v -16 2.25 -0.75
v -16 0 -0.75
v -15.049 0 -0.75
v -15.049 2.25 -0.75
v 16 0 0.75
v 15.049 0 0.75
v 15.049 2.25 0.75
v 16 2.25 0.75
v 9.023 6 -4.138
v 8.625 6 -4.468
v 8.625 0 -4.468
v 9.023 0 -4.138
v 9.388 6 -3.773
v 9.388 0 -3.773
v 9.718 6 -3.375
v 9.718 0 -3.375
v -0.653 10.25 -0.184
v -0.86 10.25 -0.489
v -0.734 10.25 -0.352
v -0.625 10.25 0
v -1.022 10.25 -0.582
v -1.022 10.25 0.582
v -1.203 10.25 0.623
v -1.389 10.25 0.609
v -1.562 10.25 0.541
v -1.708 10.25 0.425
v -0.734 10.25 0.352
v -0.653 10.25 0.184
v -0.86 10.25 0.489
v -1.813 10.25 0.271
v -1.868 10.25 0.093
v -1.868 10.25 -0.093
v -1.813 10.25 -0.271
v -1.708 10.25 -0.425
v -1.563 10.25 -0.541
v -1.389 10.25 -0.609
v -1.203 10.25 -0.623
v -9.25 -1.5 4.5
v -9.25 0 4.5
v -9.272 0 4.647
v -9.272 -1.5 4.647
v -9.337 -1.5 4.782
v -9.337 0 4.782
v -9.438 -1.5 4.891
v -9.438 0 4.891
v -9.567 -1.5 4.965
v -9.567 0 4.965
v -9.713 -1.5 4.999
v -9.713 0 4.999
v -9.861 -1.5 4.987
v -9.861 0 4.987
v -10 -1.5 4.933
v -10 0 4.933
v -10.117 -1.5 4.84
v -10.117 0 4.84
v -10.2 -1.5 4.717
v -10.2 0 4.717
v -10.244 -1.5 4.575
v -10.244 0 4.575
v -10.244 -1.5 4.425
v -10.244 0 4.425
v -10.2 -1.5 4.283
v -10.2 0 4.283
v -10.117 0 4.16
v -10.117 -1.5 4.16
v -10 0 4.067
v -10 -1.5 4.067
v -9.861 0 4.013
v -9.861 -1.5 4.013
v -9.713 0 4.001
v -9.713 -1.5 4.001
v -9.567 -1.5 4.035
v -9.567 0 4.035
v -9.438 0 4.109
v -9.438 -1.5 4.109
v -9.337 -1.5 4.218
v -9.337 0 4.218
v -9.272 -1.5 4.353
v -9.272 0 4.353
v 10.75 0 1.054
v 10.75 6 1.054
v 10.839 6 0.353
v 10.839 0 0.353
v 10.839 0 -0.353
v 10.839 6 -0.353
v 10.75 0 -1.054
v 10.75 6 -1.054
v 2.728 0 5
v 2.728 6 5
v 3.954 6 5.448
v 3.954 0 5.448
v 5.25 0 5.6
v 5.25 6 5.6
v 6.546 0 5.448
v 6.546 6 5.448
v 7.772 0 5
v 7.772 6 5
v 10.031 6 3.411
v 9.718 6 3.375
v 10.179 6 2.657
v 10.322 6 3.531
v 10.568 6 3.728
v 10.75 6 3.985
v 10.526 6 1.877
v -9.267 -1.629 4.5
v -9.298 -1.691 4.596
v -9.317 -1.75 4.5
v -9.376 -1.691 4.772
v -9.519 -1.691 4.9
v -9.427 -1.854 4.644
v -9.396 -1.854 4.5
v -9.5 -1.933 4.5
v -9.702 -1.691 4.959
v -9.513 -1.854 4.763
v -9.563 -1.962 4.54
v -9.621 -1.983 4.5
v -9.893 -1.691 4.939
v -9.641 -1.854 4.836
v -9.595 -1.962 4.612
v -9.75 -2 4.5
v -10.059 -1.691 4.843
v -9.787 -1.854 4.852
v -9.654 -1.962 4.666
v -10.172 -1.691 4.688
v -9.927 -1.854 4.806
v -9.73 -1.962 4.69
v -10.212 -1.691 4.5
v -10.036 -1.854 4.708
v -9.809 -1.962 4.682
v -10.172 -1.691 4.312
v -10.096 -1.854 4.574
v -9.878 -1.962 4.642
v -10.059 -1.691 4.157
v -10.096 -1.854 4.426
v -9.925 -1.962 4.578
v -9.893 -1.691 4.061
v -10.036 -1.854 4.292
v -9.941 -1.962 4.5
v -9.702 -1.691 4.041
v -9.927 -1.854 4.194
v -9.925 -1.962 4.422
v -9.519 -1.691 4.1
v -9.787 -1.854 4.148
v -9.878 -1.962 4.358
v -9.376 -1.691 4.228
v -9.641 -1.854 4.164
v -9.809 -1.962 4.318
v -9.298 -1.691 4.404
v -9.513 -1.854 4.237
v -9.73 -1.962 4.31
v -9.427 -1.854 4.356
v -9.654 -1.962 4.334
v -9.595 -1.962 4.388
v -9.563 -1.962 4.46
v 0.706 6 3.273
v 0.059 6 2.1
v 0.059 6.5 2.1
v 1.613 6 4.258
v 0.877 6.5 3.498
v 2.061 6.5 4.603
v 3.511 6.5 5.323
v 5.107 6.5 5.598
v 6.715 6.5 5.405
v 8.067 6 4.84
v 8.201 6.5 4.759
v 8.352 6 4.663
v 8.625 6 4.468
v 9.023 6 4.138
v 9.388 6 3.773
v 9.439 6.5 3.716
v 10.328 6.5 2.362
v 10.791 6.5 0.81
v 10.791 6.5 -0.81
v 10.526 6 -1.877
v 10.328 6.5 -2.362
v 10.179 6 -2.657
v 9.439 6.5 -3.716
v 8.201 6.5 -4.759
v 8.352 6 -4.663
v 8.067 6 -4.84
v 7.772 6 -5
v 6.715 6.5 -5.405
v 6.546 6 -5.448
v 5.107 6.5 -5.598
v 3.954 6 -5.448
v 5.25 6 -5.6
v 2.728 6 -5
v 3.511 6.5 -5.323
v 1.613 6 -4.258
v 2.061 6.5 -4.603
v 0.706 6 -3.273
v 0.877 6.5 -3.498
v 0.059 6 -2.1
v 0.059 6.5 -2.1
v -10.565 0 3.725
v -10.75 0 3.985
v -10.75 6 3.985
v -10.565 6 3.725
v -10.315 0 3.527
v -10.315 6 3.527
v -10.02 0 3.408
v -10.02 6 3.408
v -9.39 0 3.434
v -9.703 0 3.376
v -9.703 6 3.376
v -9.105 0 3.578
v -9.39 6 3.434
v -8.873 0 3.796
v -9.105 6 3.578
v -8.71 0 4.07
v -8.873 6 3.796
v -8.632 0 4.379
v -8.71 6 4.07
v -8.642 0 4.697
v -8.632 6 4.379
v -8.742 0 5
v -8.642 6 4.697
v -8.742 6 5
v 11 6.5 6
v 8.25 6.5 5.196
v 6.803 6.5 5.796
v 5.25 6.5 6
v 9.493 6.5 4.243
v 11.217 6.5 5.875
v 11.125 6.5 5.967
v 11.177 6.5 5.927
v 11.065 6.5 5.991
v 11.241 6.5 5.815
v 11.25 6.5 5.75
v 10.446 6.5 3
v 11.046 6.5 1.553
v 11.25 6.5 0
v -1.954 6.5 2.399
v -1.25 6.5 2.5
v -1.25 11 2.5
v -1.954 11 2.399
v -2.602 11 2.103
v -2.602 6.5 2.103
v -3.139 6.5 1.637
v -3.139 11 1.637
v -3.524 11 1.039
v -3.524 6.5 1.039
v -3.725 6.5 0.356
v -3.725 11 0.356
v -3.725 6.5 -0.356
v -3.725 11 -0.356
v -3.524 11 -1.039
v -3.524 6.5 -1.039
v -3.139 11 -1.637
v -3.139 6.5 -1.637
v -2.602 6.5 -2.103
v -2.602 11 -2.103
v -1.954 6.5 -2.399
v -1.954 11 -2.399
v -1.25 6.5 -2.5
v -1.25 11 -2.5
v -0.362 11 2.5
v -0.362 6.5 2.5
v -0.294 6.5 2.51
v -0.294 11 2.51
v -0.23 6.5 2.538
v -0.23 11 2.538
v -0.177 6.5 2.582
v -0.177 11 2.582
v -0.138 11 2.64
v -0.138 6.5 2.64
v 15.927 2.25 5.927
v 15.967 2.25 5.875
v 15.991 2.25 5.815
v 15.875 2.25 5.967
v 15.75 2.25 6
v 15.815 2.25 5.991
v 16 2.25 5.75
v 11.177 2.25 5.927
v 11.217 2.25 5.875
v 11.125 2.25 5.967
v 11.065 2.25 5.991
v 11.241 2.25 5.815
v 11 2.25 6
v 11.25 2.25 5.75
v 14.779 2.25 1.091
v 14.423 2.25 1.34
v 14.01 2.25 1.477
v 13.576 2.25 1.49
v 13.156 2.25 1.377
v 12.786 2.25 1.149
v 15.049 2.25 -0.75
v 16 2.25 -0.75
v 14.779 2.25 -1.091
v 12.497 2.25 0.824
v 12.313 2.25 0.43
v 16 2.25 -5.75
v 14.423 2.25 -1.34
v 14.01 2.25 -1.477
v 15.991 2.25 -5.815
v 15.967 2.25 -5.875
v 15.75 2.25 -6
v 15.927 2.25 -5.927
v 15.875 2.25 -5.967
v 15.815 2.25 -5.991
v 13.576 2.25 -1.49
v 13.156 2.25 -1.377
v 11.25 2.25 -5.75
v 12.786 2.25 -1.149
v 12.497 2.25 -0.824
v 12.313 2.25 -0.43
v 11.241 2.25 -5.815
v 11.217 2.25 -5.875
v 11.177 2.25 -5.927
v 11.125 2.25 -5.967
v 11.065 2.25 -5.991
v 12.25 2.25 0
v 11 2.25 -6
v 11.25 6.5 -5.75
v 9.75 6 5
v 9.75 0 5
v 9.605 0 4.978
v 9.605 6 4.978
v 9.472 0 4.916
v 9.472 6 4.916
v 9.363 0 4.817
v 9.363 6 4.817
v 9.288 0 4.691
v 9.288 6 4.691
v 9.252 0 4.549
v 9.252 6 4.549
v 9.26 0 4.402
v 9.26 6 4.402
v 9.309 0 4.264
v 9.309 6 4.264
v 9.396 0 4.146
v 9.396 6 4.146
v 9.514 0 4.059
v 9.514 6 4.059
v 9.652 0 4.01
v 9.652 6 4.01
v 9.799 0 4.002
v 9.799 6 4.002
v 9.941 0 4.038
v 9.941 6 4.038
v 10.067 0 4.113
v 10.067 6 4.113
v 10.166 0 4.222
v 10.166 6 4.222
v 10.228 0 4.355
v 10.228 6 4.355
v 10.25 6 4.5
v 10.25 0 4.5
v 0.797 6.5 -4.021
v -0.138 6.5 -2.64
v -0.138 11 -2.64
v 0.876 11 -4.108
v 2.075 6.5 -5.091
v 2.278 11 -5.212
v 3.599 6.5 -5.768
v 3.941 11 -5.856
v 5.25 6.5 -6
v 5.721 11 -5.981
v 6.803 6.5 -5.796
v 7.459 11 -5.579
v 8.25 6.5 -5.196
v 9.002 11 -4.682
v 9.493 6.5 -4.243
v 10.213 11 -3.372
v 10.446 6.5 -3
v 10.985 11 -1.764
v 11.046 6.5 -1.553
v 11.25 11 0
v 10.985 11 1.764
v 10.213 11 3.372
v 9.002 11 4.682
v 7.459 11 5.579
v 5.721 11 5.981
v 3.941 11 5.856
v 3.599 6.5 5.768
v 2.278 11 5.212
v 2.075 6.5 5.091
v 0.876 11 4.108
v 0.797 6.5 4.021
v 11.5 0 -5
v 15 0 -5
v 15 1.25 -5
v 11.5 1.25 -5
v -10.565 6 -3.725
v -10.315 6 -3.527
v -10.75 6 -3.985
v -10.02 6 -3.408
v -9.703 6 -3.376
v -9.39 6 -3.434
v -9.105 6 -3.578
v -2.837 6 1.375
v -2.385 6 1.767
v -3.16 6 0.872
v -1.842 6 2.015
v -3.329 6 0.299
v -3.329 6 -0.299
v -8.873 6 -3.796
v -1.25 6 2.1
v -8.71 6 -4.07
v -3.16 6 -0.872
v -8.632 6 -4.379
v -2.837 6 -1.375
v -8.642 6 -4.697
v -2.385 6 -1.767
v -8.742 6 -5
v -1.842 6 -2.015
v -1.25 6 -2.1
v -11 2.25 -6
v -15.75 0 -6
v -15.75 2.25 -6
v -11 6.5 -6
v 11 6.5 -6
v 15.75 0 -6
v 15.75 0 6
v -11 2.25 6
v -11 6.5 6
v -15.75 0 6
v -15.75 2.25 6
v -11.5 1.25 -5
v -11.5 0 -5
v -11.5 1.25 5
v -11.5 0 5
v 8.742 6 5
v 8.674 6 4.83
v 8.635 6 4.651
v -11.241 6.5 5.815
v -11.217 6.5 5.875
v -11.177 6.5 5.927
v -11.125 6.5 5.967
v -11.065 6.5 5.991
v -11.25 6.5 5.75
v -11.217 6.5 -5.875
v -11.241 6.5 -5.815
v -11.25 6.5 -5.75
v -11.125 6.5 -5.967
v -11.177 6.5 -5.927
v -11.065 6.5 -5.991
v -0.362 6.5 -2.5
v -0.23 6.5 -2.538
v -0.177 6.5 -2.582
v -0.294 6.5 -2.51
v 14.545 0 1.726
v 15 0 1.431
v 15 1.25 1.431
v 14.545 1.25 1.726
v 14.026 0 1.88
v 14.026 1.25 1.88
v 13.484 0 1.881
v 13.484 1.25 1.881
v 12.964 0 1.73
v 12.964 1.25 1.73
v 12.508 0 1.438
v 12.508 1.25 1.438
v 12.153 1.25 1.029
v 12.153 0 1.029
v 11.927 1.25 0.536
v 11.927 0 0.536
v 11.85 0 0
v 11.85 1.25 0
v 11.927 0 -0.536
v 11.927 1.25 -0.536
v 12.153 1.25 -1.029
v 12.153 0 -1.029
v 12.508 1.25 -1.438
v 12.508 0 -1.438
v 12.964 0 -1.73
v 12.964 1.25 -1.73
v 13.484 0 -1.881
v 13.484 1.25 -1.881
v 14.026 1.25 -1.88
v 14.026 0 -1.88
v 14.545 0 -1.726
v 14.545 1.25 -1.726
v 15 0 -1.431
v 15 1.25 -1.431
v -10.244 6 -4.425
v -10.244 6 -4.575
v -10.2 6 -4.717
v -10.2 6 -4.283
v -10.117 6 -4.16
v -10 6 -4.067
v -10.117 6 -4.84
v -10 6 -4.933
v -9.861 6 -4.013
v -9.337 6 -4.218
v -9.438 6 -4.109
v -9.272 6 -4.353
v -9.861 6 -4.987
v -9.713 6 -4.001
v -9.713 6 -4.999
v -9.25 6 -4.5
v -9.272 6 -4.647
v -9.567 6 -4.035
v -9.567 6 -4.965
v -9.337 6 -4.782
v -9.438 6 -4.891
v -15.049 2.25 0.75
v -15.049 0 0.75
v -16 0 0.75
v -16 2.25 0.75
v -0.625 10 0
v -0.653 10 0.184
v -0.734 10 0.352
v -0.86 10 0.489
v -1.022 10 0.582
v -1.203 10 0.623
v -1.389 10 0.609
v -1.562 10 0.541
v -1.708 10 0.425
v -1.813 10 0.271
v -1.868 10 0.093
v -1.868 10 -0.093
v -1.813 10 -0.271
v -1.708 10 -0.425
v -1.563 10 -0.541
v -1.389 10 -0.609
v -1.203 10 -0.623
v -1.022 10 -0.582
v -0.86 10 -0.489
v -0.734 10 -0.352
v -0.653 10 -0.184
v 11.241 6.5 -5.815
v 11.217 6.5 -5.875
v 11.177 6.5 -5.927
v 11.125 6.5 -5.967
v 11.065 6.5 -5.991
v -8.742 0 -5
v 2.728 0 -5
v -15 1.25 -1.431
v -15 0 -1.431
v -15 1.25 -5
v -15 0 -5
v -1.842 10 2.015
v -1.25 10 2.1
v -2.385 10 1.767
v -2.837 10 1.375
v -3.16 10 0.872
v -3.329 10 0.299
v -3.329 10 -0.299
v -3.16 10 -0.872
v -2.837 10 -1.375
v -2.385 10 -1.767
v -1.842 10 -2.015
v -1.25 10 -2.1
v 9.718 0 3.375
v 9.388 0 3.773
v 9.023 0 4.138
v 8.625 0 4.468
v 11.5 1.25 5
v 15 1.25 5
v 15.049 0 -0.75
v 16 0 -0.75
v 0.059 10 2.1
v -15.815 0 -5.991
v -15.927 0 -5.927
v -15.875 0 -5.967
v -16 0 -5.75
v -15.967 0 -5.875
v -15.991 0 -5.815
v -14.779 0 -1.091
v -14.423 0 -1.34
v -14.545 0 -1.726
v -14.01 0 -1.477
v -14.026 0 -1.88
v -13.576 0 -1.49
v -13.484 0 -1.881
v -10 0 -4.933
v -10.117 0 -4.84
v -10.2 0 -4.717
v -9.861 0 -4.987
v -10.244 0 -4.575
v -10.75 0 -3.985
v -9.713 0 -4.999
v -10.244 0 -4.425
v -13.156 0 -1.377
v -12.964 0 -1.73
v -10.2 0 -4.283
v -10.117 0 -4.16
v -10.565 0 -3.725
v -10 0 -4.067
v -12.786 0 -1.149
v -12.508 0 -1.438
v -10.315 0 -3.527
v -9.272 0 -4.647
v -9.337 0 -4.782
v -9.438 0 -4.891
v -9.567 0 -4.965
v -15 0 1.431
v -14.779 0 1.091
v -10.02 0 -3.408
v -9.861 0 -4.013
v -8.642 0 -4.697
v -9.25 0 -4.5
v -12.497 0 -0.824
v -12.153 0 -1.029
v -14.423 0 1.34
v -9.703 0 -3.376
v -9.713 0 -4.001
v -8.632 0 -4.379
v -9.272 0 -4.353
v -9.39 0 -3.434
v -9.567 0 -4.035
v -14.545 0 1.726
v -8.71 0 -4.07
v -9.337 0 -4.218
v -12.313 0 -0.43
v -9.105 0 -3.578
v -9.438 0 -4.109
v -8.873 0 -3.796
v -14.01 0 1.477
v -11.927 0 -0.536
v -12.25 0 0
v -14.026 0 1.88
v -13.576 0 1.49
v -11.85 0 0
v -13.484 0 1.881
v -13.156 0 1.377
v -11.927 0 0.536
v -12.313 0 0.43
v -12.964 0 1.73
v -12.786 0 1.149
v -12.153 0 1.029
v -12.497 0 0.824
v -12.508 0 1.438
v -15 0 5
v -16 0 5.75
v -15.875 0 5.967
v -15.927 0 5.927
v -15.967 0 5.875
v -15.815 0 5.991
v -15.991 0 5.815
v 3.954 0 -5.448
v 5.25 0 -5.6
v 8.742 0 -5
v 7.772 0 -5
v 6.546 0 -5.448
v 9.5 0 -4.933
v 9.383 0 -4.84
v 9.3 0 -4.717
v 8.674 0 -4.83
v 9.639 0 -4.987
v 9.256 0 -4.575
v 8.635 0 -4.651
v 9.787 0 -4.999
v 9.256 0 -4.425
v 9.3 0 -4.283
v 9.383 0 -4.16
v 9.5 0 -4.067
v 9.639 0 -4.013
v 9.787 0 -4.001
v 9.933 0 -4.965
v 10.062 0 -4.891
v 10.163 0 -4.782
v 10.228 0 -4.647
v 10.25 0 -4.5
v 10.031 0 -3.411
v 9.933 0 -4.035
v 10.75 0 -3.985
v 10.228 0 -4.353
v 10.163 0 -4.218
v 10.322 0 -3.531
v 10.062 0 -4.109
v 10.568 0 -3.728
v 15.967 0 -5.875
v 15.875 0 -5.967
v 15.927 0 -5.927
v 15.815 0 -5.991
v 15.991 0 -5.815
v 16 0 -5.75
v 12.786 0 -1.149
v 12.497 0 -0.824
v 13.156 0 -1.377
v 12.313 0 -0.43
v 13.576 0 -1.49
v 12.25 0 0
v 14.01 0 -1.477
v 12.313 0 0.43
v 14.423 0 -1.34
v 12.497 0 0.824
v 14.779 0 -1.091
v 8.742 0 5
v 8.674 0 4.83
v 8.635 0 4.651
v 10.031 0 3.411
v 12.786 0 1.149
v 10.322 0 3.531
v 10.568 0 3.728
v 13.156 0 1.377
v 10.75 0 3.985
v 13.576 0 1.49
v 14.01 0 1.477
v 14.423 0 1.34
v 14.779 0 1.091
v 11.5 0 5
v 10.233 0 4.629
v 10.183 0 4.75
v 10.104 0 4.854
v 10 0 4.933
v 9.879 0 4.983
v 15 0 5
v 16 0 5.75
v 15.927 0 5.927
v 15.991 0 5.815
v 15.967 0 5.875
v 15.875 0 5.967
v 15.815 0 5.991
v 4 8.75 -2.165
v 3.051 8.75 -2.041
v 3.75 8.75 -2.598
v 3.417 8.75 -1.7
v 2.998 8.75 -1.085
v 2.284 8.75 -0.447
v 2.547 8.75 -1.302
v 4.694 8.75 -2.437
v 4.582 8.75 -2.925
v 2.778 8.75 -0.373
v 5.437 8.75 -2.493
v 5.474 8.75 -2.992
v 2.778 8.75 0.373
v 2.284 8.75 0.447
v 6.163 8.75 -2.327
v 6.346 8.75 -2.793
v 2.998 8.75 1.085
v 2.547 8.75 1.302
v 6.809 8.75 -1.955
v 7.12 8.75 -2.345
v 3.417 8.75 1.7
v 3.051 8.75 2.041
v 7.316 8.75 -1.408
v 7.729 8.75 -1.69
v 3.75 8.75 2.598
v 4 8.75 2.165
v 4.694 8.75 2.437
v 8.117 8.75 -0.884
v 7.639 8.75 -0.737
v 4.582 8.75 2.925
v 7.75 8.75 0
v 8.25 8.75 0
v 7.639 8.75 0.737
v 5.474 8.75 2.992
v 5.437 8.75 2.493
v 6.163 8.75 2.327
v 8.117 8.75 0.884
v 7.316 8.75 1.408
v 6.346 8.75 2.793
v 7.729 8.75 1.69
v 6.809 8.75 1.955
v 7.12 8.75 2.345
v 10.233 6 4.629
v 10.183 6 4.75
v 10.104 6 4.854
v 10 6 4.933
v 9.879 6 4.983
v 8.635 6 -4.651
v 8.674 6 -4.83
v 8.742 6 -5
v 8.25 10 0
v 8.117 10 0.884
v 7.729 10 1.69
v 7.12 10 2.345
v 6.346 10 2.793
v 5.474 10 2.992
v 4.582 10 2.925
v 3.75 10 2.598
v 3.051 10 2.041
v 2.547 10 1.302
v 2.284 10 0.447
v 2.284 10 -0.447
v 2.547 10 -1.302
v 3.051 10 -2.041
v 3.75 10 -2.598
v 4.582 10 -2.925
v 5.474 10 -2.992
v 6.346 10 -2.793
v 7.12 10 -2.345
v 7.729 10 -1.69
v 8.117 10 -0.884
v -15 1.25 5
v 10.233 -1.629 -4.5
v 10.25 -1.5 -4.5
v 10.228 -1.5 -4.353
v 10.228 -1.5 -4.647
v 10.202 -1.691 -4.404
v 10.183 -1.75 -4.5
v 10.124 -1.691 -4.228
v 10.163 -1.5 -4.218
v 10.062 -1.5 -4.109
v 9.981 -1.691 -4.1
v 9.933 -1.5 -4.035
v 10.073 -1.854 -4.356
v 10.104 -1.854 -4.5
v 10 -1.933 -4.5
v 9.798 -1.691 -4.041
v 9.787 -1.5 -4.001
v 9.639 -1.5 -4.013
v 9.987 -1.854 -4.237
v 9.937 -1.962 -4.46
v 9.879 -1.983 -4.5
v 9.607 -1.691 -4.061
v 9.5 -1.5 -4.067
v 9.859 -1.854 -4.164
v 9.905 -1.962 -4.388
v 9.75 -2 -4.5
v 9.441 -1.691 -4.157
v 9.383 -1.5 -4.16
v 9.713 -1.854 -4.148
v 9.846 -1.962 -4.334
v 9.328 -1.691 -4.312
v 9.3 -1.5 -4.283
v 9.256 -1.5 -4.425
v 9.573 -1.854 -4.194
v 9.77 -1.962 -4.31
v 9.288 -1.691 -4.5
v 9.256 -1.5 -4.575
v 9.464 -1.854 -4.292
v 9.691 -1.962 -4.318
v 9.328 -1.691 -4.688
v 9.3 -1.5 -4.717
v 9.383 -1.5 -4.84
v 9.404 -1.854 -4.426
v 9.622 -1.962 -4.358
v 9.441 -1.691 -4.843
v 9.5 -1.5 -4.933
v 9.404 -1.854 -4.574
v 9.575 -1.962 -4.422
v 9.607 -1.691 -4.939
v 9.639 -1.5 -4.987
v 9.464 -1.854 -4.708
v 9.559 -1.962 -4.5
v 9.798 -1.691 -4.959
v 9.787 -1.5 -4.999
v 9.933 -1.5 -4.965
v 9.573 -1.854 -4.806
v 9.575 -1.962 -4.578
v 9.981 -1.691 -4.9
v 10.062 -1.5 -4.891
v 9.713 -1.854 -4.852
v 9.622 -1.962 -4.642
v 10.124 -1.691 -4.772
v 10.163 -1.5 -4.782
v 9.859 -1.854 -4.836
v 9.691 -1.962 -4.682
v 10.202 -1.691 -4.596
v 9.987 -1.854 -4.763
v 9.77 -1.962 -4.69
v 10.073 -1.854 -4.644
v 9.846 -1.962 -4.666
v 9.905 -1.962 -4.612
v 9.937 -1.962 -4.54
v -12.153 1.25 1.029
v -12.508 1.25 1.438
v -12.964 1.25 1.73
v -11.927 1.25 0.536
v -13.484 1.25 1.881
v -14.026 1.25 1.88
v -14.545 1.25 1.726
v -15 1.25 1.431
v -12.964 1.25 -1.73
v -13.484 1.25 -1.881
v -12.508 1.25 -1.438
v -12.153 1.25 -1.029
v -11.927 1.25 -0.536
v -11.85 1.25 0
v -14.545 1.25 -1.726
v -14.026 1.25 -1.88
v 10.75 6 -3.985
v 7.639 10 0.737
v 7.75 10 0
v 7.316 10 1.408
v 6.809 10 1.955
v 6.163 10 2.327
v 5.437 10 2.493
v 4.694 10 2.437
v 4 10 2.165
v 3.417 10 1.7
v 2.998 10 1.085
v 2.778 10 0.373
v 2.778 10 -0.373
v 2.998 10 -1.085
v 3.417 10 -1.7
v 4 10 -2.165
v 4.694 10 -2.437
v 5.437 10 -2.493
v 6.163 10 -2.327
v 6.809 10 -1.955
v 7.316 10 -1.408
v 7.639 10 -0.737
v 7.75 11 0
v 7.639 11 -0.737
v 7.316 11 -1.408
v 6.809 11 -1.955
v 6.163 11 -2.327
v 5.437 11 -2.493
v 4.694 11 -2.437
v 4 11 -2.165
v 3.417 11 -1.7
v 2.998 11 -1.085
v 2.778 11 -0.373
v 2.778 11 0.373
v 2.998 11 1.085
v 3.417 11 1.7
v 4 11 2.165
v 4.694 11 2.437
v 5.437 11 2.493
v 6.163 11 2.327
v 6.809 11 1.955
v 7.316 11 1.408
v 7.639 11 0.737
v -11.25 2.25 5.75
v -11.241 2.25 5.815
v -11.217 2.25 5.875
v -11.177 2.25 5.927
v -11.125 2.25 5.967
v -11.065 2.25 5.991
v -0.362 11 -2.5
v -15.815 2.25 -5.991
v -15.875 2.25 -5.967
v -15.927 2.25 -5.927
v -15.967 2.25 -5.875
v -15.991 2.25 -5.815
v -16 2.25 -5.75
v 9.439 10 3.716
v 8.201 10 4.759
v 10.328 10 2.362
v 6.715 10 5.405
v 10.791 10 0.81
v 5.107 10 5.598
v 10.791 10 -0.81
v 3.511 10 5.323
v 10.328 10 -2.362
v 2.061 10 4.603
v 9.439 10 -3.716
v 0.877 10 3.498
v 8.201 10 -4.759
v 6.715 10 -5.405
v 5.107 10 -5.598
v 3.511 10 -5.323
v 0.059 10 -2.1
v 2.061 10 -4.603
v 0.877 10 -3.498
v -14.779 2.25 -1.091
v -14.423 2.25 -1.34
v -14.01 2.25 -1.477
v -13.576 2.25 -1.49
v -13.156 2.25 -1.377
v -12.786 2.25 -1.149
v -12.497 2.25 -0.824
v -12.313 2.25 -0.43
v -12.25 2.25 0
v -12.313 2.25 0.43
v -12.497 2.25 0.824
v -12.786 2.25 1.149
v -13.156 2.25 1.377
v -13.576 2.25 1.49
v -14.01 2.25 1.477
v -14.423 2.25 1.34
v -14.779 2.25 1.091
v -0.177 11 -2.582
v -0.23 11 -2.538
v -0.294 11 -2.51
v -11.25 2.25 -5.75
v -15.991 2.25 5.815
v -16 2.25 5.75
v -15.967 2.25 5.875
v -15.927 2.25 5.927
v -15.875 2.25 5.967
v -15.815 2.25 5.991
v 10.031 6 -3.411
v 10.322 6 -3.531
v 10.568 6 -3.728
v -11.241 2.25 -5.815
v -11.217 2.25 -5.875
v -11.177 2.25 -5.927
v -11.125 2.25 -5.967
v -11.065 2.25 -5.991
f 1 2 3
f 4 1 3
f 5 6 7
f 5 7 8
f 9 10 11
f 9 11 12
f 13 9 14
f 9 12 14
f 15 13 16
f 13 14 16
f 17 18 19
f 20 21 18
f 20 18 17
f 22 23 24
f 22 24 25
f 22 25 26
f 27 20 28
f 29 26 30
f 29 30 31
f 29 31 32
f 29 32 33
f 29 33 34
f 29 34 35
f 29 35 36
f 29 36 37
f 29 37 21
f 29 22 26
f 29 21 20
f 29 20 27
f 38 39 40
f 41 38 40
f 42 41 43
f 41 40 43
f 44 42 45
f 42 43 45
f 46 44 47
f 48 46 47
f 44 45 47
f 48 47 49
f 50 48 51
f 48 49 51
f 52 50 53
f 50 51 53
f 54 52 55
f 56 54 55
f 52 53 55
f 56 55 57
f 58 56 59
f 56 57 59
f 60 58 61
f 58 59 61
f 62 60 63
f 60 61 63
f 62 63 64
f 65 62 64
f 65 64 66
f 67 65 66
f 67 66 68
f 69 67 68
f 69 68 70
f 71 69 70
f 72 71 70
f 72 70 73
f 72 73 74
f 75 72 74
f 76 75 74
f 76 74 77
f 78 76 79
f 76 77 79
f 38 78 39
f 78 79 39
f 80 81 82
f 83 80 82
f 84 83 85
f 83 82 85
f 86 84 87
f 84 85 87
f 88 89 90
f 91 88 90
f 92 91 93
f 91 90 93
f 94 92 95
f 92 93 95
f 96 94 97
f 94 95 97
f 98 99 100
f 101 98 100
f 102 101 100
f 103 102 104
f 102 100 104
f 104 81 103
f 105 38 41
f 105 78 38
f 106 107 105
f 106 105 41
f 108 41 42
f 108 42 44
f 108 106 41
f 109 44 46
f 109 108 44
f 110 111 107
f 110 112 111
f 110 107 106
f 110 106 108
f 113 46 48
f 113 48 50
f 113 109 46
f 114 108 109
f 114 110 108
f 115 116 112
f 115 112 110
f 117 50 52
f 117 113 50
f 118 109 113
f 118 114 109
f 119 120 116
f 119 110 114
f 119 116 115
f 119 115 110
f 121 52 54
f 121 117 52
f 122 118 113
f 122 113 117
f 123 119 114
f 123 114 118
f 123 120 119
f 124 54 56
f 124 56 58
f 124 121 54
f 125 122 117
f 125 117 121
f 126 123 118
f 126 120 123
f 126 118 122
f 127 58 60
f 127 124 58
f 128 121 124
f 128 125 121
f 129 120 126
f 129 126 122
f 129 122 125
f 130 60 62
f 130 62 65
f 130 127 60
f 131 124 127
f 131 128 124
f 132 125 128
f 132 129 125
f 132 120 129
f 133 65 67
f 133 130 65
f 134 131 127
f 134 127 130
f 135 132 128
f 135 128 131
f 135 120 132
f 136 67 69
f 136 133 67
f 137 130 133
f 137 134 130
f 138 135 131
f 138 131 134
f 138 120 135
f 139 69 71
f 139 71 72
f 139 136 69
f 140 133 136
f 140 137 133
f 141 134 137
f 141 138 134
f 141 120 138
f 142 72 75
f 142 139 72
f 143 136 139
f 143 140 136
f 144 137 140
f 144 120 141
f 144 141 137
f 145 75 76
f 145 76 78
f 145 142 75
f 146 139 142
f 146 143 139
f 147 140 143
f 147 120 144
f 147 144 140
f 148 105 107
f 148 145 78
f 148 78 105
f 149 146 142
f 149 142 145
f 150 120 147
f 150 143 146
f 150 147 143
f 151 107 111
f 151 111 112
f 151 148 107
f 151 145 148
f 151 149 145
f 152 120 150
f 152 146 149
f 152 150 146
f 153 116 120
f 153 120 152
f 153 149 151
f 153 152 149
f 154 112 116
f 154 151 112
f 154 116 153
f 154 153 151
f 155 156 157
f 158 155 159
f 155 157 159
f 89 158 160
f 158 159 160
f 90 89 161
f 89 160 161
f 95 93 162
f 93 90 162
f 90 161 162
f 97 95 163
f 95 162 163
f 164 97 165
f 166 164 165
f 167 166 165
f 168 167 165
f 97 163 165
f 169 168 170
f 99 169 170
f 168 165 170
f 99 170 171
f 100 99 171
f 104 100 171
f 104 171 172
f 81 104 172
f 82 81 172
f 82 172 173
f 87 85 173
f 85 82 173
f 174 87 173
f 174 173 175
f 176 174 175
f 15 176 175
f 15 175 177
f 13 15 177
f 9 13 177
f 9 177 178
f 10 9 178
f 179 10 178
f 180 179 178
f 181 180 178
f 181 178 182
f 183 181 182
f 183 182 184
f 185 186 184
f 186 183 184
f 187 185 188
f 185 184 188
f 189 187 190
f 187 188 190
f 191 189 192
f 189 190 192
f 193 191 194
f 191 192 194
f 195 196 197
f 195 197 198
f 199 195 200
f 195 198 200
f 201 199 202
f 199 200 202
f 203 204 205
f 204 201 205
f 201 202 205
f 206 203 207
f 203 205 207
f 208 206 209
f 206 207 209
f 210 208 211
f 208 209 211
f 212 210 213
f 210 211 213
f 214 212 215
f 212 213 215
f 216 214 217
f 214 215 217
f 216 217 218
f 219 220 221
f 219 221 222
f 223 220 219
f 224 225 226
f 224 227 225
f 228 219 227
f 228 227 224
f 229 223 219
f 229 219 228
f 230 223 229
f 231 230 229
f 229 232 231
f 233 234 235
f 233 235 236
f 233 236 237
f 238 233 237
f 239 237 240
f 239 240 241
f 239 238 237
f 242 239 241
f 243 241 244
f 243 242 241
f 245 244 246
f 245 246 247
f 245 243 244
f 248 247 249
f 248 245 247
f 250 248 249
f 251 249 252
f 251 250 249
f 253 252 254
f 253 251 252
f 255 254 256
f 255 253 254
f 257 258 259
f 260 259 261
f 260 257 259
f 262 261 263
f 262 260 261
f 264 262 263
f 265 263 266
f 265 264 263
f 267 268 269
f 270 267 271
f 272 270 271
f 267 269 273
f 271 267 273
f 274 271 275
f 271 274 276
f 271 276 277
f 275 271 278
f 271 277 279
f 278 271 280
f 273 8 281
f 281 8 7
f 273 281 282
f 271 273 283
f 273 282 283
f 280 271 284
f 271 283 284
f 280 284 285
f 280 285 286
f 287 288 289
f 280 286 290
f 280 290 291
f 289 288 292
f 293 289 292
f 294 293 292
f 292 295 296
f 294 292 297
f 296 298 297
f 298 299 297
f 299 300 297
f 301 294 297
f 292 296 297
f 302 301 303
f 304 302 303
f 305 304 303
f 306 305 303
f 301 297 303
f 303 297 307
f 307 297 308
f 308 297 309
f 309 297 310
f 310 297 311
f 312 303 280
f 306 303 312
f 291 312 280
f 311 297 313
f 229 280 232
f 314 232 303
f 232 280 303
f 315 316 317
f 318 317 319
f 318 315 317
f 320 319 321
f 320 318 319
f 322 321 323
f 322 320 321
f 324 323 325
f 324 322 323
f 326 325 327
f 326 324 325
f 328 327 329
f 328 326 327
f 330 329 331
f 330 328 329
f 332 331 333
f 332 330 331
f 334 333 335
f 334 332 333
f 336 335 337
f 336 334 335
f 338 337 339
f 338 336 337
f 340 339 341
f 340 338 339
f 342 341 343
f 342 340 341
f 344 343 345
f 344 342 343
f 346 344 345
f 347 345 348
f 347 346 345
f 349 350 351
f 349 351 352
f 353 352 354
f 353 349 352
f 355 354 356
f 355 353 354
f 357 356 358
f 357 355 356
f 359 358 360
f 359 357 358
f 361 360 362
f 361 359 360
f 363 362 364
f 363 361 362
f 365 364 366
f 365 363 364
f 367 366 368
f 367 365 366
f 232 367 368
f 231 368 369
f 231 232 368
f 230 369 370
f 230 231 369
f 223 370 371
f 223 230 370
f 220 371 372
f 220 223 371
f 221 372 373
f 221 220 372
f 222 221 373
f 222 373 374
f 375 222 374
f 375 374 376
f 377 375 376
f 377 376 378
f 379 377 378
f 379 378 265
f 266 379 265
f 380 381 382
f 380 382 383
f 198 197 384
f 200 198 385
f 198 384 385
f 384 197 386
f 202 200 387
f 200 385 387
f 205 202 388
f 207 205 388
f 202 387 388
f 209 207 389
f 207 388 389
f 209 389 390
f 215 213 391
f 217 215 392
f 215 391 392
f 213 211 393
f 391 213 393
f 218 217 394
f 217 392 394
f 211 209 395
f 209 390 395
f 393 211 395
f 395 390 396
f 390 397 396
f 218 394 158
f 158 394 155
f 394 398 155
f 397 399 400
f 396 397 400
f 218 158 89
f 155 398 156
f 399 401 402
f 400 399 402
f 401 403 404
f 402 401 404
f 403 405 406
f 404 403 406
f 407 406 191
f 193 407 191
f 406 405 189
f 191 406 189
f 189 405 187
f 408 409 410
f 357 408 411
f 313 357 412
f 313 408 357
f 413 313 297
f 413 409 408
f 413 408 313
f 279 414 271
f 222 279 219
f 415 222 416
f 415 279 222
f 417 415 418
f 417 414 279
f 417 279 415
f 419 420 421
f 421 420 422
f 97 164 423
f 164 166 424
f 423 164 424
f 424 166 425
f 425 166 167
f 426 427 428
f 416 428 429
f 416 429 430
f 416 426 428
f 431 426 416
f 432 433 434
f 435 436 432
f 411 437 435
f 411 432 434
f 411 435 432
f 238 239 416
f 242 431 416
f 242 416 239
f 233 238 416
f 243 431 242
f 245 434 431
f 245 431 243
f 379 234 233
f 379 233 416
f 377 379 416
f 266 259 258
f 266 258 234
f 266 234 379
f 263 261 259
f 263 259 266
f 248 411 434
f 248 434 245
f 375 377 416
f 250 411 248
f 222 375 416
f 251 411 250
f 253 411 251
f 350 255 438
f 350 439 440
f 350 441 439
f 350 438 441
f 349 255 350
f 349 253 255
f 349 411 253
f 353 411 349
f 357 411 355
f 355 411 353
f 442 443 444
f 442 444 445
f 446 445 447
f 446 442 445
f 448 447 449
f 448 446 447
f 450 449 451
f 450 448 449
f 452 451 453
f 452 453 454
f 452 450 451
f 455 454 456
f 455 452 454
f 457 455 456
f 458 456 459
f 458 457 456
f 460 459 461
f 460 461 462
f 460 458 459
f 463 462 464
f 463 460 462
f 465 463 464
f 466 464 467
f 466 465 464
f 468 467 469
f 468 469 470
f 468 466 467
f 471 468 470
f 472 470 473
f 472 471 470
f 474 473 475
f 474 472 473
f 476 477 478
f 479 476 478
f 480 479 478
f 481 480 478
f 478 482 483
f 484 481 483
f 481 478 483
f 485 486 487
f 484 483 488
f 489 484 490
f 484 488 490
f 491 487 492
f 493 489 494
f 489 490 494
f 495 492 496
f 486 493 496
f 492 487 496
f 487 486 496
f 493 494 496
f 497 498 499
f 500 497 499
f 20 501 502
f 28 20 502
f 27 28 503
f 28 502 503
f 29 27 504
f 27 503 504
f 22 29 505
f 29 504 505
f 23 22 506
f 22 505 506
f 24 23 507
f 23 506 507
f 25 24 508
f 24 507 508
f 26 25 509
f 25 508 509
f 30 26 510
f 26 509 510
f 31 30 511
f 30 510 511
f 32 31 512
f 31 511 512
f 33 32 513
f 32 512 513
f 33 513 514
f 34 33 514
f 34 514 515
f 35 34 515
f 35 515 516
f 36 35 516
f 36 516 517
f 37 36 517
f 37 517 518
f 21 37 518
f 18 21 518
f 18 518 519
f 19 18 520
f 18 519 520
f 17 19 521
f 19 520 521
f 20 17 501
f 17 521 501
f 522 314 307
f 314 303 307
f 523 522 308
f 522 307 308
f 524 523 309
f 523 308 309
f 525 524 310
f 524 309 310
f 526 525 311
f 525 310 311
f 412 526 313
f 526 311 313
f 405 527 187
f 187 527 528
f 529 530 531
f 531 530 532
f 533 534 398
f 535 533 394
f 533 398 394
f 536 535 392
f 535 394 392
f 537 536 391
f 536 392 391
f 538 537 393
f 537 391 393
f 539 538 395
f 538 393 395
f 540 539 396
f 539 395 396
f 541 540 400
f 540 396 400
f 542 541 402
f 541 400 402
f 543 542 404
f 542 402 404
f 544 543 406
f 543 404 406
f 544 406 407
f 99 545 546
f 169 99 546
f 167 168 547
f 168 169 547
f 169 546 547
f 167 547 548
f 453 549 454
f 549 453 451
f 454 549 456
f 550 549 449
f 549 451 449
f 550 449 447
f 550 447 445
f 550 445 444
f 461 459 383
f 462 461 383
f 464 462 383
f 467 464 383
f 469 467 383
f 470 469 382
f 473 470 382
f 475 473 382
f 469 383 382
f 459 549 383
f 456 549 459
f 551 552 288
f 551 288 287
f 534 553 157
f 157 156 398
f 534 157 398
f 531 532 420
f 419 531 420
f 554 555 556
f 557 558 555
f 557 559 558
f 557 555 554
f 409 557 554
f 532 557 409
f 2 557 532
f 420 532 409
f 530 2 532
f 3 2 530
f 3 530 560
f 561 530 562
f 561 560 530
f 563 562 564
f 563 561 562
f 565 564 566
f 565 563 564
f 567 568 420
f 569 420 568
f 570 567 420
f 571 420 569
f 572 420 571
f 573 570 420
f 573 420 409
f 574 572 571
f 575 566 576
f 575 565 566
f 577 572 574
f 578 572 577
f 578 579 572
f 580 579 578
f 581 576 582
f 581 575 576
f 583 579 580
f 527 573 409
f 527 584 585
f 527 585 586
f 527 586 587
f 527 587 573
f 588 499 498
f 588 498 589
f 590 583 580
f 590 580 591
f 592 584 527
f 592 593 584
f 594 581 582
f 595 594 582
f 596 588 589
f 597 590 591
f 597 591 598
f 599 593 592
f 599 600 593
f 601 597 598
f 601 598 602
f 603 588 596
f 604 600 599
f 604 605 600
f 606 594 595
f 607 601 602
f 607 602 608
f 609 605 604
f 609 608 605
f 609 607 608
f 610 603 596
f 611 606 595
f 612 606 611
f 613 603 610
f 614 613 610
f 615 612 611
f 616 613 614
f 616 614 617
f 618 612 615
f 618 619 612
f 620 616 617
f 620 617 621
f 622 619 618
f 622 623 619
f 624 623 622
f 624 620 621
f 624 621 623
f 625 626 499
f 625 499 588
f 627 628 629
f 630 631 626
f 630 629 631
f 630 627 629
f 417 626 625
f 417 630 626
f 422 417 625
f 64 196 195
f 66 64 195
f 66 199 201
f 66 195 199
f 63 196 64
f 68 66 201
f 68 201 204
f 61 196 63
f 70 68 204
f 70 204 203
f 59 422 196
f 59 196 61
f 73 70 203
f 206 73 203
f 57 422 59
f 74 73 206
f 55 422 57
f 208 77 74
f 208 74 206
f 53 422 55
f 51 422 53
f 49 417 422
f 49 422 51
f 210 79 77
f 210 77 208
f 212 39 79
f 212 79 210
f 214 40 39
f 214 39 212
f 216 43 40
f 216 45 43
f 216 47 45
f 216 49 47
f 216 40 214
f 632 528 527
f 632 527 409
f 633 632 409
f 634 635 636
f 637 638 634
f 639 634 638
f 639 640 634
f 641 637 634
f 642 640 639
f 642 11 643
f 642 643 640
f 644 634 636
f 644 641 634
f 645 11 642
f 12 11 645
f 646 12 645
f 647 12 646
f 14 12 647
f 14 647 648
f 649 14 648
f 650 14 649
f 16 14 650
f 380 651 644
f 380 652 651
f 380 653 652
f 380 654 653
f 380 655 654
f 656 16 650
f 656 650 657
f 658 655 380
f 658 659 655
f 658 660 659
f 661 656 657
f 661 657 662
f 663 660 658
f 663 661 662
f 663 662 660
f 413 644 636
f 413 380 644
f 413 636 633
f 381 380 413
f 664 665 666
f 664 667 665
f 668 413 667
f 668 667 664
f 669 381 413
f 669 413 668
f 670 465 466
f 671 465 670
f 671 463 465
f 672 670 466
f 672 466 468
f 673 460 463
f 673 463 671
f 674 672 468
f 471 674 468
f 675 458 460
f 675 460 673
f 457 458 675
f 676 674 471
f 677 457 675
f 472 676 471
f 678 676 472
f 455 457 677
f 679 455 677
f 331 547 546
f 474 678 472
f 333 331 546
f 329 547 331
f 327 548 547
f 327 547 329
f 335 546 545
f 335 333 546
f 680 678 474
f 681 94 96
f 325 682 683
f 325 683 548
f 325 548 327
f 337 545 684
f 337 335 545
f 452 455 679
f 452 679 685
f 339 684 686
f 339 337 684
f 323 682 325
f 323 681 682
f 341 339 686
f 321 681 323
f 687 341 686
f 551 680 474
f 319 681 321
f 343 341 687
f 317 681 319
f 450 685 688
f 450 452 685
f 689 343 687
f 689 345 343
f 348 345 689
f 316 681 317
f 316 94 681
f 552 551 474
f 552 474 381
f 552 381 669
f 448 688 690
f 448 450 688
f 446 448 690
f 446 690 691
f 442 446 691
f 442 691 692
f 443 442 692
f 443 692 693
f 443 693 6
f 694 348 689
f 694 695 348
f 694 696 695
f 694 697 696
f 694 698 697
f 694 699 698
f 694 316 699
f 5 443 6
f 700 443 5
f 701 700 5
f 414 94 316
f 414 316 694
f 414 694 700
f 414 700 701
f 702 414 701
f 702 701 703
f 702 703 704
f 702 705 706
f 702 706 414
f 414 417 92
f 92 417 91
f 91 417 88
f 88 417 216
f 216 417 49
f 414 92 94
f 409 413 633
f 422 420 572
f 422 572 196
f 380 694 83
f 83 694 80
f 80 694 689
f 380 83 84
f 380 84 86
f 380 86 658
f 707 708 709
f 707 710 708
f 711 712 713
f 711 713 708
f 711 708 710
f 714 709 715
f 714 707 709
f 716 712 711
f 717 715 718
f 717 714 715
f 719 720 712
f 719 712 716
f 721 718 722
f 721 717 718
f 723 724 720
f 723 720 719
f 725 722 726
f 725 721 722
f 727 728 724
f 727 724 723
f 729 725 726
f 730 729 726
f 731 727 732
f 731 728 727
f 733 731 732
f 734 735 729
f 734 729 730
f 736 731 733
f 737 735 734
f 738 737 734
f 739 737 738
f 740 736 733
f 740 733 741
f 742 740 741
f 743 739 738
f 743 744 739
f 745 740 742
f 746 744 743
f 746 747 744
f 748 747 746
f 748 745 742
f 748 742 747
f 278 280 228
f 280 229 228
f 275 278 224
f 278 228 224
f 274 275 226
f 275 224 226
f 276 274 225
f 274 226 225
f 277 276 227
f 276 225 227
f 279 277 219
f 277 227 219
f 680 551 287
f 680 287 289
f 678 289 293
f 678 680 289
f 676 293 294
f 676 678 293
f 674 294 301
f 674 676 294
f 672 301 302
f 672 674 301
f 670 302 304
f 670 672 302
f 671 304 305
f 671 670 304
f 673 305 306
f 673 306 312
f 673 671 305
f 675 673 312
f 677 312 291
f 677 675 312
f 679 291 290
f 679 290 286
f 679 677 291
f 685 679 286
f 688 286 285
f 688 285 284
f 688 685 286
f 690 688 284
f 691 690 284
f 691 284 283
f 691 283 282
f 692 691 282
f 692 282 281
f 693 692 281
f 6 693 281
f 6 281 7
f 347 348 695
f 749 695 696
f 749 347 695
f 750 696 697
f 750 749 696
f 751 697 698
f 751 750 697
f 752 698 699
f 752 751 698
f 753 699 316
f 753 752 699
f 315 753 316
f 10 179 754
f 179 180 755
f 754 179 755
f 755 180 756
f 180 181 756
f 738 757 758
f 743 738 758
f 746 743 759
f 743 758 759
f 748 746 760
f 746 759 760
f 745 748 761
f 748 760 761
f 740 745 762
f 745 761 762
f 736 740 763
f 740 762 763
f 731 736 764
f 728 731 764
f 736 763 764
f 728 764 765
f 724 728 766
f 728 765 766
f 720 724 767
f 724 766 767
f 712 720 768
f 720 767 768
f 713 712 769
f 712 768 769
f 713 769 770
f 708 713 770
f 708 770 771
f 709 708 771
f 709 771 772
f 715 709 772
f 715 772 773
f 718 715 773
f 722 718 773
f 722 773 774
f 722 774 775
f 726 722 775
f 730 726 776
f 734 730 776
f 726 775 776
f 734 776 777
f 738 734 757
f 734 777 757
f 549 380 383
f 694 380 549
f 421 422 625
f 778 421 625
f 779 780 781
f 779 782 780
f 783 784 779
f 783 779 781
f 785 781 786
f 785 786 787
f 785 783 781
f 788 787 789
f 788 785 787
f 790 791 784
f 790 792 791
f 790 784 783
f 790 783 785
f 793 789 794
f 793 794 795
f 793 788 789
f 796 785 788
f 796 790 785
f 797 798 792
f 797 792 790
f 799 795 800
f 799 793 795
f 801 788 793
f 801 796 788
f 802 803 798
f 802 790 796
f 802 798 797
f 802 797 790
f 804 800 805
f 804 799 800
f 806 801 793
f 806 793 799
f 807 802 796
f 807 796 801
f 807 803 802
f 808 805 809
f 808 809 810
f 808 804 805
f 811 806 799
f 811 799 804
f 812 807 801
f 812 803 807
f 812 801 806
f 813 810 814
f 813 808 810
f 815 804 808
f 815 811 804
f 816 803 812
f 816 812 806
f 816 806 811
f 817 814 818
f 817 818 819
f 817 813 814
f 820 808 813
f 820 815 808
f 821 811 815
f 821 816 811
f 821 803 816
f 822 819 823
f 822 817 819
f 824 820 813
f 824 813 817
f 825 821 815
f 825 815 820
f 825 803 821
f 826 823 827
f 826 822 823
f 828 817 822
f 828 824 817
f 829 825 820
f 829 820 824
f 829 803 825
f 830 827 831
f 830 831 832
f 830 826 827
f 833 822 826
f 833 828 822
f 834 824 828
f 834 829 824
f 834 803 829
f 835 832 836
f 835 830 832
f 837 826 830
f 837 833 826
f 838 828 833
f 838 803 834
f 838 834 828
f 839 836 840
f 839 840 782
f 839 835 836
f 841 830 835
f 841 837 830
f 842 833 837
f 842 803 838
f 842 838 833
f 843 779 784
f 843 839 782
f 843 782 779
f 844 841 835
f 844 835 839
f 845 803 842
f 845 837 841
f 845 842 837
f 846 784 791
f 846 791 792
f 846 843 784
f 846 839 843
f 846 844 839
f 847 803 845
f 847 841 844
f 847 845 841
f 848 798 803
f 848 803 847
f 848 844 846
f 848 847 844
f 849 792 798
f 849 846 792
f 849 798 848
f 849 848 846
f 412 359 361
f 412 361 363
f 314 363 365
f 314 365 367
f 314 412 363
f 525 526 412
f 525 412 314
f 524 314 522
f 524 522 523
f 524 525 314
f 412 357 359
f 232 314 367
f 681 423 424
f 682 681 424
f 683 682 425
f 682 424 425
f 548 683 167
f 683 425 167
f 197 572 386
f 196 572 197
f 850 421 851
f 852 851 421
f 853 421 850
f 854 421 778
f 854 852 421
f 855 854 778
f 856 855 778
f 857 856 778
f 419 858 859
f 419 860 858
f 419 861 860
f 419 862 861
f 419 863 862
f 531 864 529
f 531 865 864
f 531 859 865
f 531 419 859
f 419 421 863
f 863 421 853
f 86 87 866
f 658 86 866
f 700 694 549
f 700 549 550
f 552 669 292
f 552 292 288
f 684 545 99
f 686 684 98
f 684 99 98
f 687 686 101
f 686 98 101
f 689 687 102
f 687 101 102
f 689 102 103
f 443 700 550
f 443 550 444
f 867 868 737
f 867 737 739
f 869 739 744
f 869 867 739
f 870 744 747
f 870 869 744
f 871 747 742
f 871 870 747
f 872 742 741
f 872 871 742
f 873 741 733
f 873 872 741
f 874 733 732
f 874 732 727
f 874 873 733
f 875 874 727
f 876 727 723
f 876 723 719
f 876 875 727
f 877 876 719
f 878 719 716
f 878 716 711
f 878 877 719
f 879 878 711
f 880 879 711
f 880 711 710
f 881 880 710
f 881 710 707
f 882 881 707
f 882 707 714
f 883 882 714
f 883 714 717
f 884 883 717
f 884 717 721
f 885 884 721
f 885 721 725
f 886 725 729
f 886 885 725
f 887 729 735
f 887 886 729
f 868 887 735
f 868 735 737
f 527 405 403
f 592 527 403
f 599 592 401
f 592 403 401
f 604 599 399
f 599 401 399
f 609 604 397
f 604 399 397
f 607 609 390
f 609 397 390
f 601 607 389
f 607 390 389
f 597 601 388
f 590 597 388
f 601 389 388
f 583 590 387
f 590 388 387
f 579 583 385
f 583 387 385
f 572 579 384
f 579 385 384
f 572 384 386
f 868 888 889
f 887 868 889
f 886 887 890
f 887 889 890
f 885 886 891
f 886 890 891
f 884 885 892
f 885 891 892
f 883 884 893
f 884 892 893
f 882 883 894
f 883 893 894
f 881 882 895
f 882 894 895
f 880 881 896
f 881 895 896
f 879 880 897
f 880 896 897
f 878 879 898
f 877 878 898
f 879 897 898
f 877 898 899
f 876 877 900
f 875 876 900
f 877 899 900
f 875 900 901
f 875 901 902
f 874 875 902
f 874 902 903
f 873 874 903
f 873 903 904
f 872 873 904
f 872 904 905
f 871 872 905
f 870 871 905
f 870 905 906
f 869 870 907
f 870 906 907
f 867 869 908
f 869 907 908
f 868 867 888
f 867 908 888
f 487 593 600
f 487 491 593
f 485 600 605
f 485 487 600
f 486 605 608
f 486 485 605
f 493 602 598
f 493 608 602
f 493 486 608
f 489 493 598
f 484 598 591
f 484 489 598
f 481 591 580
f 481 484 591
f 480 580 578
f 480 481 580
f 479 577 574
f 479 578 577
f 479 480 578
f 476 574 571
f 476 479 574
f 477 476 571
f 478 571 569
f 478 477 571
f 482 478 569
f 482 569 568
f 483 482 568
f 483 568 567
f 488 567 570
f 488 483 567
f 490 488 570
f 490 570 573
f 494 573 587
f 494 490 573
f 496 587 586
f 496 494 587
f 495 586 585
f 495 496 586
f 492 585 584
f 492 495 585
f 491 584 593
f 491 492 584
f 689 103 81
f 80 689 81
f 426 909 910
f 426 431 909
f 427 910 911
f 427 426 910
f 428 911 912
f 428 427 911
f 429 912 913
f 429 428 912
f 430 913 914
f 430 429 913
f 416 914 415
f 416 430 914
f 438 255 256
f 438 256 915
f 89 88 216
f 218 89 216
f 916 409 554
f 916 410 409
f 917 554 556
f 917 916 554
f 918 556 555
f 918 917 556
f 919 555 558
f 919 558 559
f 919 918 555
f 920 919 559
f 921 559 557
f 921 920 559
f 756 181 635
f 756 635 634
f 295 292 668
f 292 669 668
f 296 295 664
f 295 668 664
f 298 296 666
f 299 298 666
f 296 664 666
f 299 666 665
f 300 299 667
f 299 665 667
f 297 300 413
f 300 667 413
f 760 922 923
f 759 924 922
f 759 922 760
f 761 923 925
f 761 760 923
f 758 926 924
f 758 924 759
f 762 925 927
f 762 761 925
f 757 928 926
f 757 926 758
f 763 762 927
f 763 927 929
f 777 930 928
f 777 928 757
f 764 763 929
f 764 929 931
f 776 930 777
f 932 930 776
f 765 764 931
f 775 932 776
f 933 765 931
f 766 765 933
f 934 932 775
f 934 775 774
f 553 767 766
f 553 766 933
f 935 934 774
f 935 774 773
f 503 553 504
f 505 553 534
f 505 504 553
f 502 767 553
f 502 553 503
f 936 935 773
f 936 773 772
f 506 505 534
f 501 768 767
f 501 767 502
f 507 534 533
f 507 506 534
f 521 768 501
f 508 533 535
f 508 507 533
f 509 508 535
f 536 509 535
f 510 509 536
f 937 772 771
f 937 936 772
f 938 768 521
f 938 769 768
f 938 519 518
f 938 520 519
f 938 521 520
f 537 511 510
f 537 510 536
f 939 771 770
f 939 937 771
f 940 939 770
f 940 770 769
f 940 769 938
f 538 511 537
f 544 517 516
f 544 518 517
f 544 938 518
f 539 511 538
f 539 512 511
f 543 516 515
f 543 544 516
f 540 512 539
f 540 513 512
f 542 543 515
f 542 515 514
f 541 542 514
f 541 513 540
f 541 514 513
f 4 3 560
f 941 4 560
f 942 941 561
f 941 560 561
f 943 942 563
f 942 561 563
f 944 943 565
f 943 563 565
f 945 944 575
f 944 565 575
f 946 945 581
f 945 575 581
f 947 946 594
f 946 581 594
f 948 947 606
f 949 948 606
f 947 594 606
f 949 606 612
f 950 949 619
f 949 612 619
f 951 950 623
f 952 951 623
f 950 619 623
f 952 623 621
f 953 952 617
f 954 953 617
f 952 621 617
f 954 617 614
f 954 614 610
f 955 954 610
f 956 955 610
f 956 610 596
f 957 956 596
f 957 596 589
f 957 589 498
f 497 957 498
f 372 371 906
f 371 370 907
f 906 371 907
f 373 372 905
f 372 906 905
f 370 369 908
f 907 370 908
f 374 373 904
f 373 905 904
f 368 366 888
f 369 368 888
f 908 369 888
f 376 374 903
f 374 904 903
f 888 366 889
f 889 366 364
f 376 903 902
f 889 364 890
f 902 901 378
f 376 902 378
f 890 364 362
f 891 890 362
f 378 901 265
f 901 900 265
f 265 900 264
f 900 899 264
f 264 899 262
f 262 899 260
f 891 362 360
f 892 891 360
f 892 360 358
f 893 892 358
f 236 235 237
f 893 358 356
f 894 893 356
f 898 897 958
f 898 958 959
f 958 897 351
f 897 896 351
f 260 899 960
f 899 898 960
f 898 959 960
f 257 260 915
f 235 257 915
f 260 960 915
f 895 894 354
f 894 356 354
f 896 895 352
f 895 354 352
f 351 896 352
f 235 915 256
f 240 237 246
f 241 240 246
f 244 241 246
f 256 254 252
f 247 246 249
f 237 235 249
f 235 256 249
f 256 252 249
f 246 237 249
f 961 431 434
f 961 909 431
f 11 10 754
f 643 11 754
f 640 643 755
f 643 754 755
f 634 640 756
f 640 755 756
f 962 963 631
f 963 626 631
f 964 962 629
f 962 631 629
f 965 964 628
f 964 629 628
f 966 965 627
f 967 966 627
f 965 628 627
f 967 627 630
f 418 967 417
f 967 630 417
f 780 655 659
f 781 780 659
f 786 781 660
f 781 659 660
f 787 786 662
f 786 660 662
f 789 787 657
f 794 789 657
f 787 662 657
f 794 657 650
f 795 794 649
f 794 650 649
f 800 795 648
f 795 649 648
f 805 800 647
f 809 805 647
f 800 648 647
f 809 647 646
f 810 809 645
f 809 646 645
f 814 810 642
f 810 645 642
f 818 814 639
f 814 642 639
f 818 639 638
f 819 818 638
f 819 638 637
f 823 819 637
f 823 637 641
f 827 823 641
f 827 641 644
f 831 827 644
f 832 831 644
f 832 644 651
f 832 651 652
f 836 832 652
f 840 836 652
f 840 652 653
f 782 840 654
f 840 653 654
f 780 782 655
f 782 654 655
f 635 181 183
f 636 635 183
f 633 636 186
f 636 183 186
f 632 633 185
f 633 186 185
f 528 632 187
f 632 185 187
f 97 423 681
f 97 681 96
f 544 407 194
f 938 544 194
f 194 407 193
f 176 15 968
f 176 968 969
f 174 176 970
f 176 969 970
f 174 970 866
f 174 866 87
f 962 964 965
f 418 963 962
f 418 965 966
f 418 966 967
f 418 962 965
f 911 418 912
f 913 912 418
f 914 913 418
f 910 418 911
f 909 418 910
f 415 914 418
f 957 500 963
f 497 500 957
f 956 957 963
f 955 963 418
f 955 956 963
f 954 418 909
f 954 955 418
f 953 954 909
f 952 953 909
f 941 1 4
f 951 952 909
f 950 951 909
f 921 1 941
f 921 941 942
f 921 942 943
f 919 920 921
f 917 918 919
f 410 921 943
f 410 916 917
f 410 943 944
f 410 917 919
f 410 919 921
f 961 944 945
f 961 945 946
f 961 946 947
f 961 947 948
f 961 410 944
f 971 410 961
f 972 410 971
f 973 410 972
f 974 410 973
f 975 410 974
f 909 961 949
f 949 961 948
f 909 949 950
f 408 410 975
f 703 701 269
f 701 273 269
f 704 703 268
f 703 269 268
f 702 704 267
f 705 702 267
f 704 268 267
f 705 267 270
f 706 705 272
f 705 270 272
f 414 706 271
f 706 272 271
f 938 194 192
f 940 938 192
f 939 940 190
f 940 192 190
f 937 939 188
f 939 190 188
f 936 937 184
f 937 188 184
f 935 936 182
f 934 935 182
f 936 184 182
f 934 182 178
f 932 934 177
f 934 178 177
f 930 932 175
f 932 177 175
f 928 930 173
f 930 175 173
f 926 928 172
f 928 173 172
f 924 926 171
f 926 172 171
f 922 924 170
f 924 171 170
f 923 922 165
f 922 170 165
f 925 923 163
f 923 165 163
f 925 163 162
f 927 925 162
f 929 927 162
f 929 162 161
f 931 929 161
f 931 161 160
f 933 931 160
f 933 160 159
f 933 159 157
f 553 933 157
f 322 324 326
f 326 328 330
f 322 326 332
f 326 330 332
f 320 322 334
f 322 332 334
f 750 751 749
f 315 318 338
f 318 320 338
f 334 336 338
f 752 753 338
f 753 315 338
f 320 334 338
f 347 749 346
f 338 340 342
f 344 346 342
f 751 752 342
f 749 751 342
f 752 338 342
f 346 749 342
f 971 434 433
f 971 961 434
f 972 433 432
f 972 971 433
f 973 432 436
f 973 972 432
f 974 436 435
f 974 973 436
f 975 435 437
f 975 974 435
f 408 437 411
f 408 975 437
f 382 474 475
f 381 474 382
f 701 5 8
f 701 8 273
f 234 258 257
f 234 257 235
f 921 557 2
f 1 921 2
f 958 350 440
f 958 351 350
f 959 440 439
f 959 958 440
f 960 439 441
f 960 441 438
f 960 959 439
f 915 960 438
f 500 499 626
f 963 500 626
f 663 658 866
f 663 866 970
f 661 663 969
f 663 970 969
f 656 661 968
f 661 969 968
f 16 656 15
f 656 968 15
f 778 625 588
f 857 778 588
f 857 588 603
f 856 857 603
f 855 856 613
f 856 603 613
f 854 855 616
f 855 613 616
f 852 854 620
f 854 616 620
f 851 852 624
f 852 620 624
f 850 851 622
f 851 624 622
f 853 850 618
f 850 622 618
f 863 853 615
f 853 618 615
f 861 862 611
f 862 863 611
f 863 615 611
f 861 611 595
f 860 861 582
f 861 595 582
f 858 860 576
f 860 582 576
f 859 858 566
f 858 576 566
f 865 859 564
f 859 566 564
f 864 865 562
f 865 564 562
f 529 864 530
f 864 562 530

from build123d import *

# Parameters (mm, degrees)
SKETCH1_W            = 22.5
SKETCH1_H            = 12
BOSS_EXTRUDE1_DEPTH  = 6.5
SKETCH2_W            = 22.5
SKETCH2_H            = 12
BOSS_EXTRUDE2_DEPTH  = 0.5
BOSS_EXTRUDE3_DEPTH  = 4.5
SKETCH4_R            = 2.5
BOSS_EXTRUDE4_DEPTH  = 1
CUT_EXTRUDE1_DEPTH   = 7.5
SKETCH6_R            = 3
SKETCH6_R_2          = 2.5
BOSS_EXTRUDE5_DEPTH  = 1.25
BOSS_EXTRUDE7_DEPTH  = 2.25
BOSS_EXTRUDE8_DEPTH  = 1
SKETCH9_R            = 0.625
CUT_EXTRUDE2_DEPTH   = 0.25
SKETCH11_R           = 1.125
SKETCH11_R_2         = 0.5
BOSS_EXTRUDE9_DEPTH  = 6
SKETCH12_R           = 0.5
BOSS_EXTRUDE10_DEPTH = 2
FILLET1_R            = 0.5
FILLET2_R            = 0.25
CUT_EXTRUDE3_DEPTH   = 6


with BuildPart() as part:
    # Sketch1 → Boss-Extrude1 (new body)
    with BuildSketch(Plane(origin=(0, 0, 0), x_dir=(1, 0, 0), z_dir=(0, 1, 0))):
        Rectangle(SKETCH1_W, SKETCH1_H)
        Polygon((10.25, 5), (-10.25, 5), (-10.75, 5), (-10.75, -5), (-10.25, -5), (10.25, -5), (10.75, -5), (10.75, 5), align=None, mode=Mode.SUBTRACT)
    extrude(amount=BOSS_EXTRUDE1_DEPTH)

    # Sketch2 → Boss-Extrude2 (add)
    with BuildSketch(Plane(origin=(0, 6.5, 0), x_dir=(1, 0, 0), z_dir=(0, 1, 0))):
        Rectangle(SKETCH2_W, SKETCH2_H)
    extrude(amount=-BOSS_EXTRUDE2_DEPTH)

    # Sketch3 → Boss-Extrude3 (add)
    with BuildSketch(Plane(origin=(0, 6.5, 0), x_dir=(1, 0, 0), z_dir=(0, 1, 0))):
        with BuildLine():
            Line((-1.25, 2.5), (-0.204356057, 2.5))
            ThreePointArc((-0.204356057, 2.5), (11.25, 0), (-0.204356057, -2.5))
            Line((-0.204356057, -2.5), (-1.25, -2.5))
            ThreePointArc((-1.25, -2.5), (-3.75, 0), (-1.25, 2.5))
        make_face()
        with BuildLine():
            Line((-1.25, 2.1), (0.058661059, 2.1))
            ThreePointArc((0.058661059, 2.1), (10.85, 0), (0.058661059, -2.1))
            Line((0.058661059, -2.1), (-1.25, -2.1))
            ThreePointArc((-1.25, -2.1), (-3.35, 0), (-1.25, 2.1))
        make_face(mode=Mode.SUBTRACT)
    extrude(amount=BOSS_EXTRUDE3_DEPTH)

    # Sketch4 → Boss-Extrude4 (add)
    with BuildSketch(Plane(origin=(0, 11, 0), x_dir=(1, 0, 0), z_dir=(0, 1, 0))):
        with BuildLine():
            ThreePointArc((-1.25, -2.1), (-3.35, 0), (-1.25, 2.1))
            Line((-1.25, 2.1), (0.058661059, 2.1))
            ThreePointArc((0.058661059, 2.1), (10.85, 0), (0.058661059, -2.1))
            Line((0.058661059, -2.1), (-1.25, -2.1))
        make_face()
        with Locations((5.25, 0)):
            Circle(SKETCH4_R, mode=Mode.SUBTRACT)
    extrude(amount=-BOSS_EXTRUDE4_DEPTH)

    # Sketch5 → Cut-Extrude1 (cut, through all)
    with BuildSketch(Plane(origin=(0, 6.5, 0), x_dir=(1, 0, 0), z_dir=(0, 1, 0))):
        with BuildLine():
            Line((-1.25, -2.1), (0.058661059, -2.1))
            ThreePointArc((0.058661059, -2.1), (10.85, 0), (0.058661059, 2.1))
            Line((0.058661059, 2.1), (-1.25, 2.1))
            ThreePointArc((-1.25, 2.1), (-3.35, 0), (-1.25, -2.1))
        make_face()
    extrude(amount=-CUT_EXTRUDE1_DEPTH, mode=Mode.SUBTRACT)

    # Sketch6 → Boss-Extrude5 (add)
    with BuildSketch(Plane.XZ.offset(-10)):
        with Locations((5.25, 0)):
            Circle(SKETCH6_R)
        with Locations((5.25, 0)):
            Circle(SKETCH6_R_2, mode=Mode.SUBTRACT)
    extrude(amount=BOSS_EXTRUDE5_DEPTH)

    # Sketch7 → Boss-Extrude7 (add)
    with BuildSketch(Plane(origin=(0, 0, 0), x_dir=(1, 0, 0), z_dir=(0, 1, 0))):
        with BuildLine():
            Line((-11.25, -6), (-11.25, 6))
            Line((-11.25, 6), (-16, 6))
            Line((-16, 6), (-16, 0.75))
            Line((-16, 0.75), (-15.049038106, 0.75))
            ThreePointArc((-15.049038106, 0.75), (-12.25, 0), (-15.049038106, -0.75))
            Line((-15.049038106, -0.75), (-16, -0.75))
            Line((-16, -0.75), (-16, -6))
            Line((-16, -6), (-11.25, -6))
        make_face()
        with BuildLine():
            Line((-15, 1.430908802), (-15, 5))
            Line((-15, 5), (-11.5, 5))
            Line((-11.5, 5), (-11.5, -5))
            Line((-11.5, -5), (-15, -5))
            Line((-15, -5), (-15, -1.430908802))
            ThreePointArc((-15, -1.430908802), (-11.85, 0), (-15, 1.430908802))
        make_face(mode=Mode.SUBTRACT)
    boss_extrude7 = extrude(amount=BOSS_EXTRUDE7_DEPTH)

    # Sketch8 → Boss-Extrude8 (add)
    with BuildSketch(Plane(origin=(0, 2.25, 0), x_dir=(1, 0, 0), z_dir=(0, 1, 0))):
        with BuildLine():
            Line((-15.049038106, 0.75), (-16, 0.75))
            Line((-16, 0.75), (-16, 6))
            Line((-16, 6), (-11.25, 6))
            Line((-11.25, 6), (-11.25, -6))
            Line((-11.25, -6), (-16, -6))
            Line((-16, -6), (-16, -0.75))
            Line((-16, -0.75), (-15.049038106, -0.75))
            ThreePointArc((-15.049038106, -0.75), (-12.25, 0), (-15.049038106, 0.75))
        make_face()
    boss_extrude8 = extrude(amount=-BOSS_EXTRUDE8_DEPTH)

    # Mirror1: Boss-Extrude7, Boss-Extrude8 across plane
    add(boss_extrude7.mirror(Plane(origin=(0, 0, 0), x_dir=(0, 0, 1), z_dir=(1, 0, 0))))
    add(boss_extrude8.mirror(Plane(origin=(0, 0, 0), x_dir=(0, 0, 1), z_dir=(1, 0, 0))))

    # Sketch9 → Cut-Extrude2 (cut)
    with BuildSketch(Plane.XZ.offset(-10)):
        with Locations((-1.25, 0)):
            Circle(SKETCH9_R)
    extrude(amount=-CUT_EXTRUDE2_DEPTH, mode=Mode.SUBTRACT)

    # Sketch11 → Boss-Extrude9 (add)
    with BuildSketch(Plane.XZ.offset(-6)):
        with Locations((-9.75, 4.5)):
            Circle(SKETCH11_R)
        with Locations((-9.75, -4.5)):
            Circle(SKETCH11_R)
        with Locations((-9.75, -4.5)):
            Circle(SKETCH11_R_2, mode=Mode.SUBTRACT)
        with Locations((9.75, -4.5)):
            Circle(SKETCH11_R)
        with Locations((9.75, 4.5)):
            Circle(SKETCH11_R)
        with Locations((9.75, 4.5)):
            Circle(SKETCH11_R_2, mode=Mode.SUBTRACT)
    extrude(amount=BOSS_EXTRUDE9_DEPTH)

    # Sketch12 → Boss-Extrude10 (add)
    with BuildSketch(Plane.XZ):
        with Locations((-9.75, 4.5)):
            Circle(SKETCH12_R)
        with Locations((9.75, -4.5)):
            Circle(SKETCH12_R)
    extrude(amount=BOSS_EXTRUDE10_DEPTH)

    # Fillet1
    fillet1_edges = [part.edges().sort_by_distance(p)[0] for p in [
        (-10.25, -2, 4.5),
        (9.25, -2, -4.5),
    ]]
    fillet(fillet1_edges, radius=FILLET1_R)

    # Fillet2
    fillet2_edges = [part.edges().sort_by_distance(p)[0] for p in [
        (-16, 1.125, 6),
        (-16, 1.125, -6),
        (16, 1.125, -6),
        (16, 1.125, 6),
        (-0.204356057, 8.75, -2.5),
        (-0.204356057, 8.75, 2.5),
        (-11.25, 4.375, -6),
        (11.25, 4.375, -6),
        (11.25, 4.375, 6),
        (-11.25, 4.375, 6),
    ]]
    fillet(fillet2_edges, radius=FILLET2_R)

    # Sketch13 → Cut-Extrude3 (cut)
    with BuildSketch(Plane.XZ):
        with BuildLine():
            Line((0.058661059, 2.1), (0.058661059, -2.1))
            ThreePointArc((0.058661059, -2.1), (10.85, 0), (0.058661059, 2.1))
        make_face()
    extrude(amount=-CUT_EXTRUDE3_DEPTH, mode=Mode.SUBTRACT)


solid = part.part
